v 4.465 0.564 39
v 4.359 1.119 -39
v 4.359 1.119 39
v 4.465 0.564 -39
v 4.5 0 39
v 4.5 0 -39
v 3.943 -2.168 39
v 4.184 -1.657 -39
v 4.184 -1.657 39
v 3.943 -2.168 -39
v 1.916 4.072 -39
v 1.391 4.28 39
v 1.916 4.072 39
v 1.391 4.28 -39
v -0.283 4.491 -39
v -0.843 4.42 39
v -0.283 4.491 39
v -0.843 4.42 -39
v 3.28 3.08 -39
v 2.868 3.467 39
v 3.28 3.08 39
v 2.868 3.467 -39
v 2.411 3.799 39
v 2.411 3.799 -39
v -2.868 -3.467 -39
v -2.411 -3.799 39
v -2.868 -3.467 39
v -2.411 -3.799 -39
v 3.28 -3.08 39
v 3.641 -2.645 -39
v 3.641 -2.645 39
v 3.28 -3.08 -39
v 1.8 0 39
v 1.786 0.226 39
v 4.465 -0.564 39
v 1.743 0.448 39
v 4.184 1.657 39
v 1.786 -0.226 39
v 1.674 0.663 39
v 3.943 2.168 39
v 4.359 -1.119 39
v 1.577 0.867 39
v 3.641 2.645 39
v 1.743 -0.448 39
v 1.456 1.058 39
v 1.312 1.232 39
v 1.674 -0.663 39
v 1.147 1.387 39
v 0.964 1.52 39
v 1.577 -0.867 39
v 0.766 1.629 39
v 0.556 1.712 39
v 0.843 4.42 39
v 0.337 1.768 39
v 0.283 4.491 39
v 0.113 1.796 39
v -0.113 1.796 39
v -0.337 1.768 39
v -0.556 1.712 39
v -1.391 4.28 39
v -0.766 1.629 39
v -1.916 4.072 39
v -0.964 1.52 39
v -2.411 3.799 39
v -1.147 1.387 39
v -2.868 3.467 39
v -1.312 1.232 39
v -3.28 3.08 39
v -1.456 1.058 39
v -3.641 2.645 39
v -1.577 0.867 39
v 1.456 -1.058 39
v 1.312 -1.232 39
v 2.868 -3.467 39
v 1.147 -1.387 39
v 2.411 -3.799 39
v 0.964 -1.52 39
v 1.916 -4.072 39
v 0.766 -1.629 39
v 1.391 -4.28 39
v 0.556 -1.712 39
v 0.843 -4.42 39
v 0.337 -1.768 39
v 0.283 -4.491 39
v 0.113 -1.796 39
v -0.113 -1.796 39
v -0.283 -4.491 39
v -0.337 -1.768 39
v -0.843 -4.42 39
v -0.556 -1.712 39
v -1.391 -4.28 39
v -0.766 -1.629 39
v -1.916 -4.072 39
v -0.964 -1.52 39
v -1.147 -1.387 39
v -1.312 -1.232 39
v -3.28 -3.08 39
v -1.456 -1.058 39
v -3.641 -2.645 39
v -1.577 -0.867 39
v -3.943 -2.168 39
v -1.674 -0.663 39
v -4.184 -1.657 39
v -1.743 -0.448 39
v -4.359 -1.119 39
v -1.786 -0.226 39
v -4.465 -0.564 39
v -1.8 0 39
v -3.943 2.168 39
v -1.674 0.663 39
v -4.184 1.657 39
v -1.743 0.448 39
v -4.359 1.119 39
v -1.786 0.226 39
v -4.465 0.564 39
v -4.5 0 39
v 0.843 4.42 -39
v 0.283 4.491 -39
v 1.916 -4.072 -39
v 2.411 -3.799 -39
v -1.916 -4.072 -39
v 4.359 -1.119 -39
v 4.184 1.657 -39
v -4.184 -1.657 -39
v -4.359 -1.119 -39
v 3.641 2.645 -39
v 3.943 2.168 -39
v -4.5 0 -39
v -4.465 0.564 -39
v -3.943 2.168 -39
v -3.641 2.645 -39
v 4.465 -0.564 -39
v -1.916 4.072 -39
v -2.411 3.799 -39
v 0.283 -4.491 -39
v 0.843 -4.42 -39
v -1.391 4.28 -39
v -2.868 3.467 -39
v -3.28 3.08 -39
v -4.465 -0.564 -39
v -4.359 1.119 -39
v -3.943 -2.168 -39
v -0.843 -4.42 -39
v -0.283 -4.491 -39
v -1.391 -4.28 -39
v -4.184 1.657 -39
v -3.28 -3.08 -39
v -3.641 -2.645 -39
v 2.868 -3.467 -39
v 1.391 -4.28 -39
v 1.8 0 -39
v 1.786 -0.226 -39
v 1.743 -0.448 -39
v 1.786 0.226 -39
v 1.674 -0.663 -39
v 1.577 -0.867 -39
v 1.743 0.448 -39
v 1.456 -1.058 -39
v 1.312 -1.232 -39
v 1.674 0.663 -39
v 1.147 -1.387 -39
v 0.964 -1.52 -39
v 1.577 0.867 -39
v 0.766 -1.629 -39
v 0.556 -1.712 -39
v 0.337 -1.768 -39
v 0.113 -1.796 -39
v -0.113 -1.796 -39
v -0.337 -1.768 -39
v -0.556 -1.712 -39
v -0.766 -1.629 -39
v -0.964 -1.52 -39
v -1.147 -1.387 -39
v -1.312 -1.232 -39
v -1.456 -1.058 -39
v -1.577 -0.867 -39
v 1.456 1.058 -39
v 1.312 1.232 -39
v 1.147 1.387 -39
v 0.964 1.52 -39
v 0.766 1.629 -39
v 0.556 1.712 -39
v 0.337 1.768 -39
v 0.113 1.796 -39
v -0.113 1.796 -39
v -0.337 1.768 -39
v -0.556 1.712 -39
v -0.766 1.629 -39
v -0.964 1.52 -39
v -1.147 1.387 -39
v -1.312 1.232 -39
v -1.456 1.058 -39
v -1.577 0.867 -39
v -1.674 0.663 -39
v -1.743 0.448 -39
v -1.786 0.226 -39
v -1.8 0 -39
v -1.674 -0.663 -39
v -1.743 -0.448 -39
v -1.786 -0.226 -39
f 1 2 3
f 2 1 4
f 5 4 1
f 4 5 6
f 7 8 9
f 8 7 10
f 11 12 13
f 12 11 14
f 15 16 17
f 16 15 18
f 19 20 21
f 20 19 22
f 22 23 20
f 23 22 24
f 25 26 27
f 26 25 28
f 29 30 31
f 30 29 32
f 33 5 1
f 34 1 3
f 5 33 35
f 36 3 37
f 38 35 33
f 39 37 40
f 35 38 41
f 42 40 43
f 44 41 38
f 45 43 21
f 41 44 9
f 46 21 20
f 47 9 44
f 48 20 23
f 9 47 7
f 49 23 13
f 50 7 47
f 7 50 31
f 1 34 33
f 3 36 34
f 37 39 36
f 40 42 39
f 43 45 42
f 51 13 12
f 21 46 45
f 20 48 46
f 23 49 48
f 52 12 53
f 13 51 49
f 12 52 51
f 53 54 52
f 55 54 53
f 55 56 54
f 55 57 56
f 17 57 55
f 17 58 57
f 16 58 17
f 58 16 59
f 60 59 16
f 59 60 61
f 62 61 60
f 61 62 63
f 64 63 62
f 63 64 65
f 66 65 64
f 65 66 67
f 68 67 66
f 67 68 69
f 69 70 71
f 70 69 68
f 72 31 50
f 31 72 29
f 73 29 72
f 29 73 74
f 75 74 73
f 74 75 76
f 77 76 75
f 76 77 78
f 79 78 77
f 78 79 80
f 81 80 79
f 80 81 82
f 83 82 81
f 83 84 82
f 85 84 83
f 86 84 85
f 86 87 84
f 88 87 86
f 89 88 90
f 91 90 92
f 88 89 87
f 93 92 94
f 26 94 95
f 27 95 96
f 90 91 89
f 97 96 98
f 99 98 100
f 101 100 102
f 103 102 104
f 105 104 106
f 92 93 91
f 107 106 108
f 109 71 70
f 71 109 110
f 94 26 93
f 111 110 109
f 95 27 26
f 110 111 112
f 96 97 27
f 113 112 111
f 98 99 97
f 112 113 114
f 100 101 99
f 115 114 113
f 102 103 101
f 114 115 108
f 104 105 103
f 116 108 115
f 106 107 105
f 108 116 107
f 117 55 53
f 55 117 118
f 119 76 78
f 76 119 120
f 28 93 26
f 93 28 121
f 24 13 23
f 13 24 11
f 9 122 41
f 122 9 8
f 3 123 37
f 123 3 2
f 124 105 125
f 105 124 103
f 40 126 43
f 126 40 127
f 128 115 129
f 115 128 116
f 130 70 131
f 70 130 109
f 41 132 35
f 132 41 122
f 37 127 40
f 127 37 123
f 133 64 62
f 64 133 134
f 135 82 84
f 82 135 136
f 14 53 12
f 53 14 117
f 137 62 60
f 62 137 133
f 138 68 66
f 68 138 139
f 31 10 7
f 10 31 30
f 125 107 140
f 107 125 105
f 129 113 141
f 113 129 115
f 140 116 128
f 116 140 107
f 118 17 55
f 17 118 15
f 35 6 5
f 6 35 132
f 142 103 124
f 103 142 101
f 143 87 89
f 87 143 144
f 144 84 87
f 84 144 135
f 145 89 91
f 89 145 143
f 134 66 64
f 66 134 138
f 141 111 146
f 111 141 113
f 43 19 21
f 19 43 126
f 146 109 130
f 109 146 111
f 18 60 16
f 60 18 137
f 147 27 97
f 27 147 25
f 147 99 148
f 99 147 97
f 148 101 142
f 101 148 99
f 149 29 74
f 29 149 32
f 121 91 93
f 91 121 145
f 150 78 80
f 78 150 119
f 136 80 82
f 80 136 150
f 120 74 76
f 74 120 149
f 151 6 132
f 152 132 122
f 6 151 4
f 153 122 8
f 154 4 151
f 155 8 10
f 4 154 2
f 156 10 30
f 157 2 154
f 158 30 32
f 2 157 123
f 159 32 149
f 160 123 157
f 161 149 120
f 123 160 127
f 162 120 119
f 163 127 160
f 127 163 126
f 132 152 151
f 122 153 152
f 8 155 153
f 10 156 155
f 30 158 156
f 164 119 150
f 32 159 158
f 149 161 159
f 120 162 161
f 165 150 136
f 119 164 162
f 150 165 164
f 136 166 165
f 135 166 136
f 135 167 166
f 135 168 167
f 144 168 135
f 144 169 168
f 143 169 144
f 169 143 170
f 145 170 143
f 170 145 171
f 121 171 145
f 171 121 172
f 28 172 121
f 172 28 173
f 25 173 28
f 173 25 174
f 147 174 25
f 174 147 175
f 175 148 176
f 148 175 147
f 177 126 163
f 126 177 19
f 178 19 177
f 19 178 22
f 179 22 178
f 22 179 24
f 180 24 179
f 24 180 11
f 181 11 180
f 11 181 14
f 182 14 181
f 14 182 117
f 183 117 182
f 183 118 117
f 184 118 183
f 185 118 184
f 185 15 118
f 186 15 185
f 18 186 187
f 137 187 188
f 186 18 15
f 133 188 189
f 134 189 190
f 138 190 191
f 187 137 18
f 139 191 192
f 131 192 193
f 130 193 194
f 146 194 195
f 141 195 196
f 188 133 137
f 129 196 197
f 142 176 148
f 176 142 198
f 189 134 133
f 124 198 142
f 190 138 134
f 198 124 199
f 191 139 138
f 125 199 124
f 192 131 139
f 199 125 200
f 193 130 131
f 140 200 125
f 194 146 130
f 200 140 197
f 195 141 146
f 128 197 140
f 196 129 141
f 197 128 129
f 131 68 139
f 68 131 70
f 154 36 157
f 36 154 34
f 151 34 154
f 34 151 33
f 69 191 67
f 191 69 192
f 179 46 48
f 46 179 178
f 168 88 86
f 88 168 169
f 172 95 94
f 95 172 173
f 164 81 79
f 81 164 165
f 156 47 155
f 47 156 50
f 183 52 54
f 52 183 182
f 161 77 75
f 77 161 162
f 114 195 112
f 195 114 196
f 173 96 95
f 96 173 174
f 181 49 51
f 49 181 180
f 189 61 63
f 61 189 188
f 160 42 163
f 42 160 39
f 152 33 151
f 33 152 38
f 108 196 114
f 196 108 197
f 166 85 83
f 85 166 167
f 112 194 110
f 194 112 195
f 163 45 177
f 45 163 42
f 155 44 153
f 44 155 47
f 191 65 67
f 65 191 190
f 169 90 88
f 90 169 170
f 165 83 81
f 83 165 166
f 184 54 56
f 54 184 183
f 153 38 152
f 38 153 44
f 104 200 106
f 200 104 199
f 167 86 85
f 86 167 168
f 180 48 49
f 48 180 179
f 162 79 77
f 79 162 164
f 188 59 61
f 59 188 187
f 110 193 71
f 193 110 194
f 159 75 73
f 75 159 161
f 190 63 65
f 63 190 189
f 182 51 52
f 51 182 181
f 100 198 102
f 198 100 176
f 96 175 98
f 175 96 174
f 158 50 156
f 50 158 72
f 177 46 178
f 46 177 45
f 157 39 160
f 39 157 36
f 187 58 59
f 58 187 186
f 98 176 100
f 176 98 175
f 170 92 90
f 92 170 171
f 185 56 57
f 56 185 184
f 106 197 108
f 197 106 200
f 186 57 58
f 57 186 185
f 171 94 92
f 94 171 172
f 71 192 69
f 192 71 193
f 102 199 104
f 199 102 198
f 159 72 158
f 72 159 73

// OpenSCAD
$fn = 50;


difference() {
	union() {
		translate(v = [0, 0, -39.0000000000]) {
			cylinder(h = 78, r = 4.5000000000);
		}
	}
	union() {
		#translate(v = [0, 0, -100.0000000000]) {
			cylinder(h = 200, r = 1.8000000000);
		}
	}
}
